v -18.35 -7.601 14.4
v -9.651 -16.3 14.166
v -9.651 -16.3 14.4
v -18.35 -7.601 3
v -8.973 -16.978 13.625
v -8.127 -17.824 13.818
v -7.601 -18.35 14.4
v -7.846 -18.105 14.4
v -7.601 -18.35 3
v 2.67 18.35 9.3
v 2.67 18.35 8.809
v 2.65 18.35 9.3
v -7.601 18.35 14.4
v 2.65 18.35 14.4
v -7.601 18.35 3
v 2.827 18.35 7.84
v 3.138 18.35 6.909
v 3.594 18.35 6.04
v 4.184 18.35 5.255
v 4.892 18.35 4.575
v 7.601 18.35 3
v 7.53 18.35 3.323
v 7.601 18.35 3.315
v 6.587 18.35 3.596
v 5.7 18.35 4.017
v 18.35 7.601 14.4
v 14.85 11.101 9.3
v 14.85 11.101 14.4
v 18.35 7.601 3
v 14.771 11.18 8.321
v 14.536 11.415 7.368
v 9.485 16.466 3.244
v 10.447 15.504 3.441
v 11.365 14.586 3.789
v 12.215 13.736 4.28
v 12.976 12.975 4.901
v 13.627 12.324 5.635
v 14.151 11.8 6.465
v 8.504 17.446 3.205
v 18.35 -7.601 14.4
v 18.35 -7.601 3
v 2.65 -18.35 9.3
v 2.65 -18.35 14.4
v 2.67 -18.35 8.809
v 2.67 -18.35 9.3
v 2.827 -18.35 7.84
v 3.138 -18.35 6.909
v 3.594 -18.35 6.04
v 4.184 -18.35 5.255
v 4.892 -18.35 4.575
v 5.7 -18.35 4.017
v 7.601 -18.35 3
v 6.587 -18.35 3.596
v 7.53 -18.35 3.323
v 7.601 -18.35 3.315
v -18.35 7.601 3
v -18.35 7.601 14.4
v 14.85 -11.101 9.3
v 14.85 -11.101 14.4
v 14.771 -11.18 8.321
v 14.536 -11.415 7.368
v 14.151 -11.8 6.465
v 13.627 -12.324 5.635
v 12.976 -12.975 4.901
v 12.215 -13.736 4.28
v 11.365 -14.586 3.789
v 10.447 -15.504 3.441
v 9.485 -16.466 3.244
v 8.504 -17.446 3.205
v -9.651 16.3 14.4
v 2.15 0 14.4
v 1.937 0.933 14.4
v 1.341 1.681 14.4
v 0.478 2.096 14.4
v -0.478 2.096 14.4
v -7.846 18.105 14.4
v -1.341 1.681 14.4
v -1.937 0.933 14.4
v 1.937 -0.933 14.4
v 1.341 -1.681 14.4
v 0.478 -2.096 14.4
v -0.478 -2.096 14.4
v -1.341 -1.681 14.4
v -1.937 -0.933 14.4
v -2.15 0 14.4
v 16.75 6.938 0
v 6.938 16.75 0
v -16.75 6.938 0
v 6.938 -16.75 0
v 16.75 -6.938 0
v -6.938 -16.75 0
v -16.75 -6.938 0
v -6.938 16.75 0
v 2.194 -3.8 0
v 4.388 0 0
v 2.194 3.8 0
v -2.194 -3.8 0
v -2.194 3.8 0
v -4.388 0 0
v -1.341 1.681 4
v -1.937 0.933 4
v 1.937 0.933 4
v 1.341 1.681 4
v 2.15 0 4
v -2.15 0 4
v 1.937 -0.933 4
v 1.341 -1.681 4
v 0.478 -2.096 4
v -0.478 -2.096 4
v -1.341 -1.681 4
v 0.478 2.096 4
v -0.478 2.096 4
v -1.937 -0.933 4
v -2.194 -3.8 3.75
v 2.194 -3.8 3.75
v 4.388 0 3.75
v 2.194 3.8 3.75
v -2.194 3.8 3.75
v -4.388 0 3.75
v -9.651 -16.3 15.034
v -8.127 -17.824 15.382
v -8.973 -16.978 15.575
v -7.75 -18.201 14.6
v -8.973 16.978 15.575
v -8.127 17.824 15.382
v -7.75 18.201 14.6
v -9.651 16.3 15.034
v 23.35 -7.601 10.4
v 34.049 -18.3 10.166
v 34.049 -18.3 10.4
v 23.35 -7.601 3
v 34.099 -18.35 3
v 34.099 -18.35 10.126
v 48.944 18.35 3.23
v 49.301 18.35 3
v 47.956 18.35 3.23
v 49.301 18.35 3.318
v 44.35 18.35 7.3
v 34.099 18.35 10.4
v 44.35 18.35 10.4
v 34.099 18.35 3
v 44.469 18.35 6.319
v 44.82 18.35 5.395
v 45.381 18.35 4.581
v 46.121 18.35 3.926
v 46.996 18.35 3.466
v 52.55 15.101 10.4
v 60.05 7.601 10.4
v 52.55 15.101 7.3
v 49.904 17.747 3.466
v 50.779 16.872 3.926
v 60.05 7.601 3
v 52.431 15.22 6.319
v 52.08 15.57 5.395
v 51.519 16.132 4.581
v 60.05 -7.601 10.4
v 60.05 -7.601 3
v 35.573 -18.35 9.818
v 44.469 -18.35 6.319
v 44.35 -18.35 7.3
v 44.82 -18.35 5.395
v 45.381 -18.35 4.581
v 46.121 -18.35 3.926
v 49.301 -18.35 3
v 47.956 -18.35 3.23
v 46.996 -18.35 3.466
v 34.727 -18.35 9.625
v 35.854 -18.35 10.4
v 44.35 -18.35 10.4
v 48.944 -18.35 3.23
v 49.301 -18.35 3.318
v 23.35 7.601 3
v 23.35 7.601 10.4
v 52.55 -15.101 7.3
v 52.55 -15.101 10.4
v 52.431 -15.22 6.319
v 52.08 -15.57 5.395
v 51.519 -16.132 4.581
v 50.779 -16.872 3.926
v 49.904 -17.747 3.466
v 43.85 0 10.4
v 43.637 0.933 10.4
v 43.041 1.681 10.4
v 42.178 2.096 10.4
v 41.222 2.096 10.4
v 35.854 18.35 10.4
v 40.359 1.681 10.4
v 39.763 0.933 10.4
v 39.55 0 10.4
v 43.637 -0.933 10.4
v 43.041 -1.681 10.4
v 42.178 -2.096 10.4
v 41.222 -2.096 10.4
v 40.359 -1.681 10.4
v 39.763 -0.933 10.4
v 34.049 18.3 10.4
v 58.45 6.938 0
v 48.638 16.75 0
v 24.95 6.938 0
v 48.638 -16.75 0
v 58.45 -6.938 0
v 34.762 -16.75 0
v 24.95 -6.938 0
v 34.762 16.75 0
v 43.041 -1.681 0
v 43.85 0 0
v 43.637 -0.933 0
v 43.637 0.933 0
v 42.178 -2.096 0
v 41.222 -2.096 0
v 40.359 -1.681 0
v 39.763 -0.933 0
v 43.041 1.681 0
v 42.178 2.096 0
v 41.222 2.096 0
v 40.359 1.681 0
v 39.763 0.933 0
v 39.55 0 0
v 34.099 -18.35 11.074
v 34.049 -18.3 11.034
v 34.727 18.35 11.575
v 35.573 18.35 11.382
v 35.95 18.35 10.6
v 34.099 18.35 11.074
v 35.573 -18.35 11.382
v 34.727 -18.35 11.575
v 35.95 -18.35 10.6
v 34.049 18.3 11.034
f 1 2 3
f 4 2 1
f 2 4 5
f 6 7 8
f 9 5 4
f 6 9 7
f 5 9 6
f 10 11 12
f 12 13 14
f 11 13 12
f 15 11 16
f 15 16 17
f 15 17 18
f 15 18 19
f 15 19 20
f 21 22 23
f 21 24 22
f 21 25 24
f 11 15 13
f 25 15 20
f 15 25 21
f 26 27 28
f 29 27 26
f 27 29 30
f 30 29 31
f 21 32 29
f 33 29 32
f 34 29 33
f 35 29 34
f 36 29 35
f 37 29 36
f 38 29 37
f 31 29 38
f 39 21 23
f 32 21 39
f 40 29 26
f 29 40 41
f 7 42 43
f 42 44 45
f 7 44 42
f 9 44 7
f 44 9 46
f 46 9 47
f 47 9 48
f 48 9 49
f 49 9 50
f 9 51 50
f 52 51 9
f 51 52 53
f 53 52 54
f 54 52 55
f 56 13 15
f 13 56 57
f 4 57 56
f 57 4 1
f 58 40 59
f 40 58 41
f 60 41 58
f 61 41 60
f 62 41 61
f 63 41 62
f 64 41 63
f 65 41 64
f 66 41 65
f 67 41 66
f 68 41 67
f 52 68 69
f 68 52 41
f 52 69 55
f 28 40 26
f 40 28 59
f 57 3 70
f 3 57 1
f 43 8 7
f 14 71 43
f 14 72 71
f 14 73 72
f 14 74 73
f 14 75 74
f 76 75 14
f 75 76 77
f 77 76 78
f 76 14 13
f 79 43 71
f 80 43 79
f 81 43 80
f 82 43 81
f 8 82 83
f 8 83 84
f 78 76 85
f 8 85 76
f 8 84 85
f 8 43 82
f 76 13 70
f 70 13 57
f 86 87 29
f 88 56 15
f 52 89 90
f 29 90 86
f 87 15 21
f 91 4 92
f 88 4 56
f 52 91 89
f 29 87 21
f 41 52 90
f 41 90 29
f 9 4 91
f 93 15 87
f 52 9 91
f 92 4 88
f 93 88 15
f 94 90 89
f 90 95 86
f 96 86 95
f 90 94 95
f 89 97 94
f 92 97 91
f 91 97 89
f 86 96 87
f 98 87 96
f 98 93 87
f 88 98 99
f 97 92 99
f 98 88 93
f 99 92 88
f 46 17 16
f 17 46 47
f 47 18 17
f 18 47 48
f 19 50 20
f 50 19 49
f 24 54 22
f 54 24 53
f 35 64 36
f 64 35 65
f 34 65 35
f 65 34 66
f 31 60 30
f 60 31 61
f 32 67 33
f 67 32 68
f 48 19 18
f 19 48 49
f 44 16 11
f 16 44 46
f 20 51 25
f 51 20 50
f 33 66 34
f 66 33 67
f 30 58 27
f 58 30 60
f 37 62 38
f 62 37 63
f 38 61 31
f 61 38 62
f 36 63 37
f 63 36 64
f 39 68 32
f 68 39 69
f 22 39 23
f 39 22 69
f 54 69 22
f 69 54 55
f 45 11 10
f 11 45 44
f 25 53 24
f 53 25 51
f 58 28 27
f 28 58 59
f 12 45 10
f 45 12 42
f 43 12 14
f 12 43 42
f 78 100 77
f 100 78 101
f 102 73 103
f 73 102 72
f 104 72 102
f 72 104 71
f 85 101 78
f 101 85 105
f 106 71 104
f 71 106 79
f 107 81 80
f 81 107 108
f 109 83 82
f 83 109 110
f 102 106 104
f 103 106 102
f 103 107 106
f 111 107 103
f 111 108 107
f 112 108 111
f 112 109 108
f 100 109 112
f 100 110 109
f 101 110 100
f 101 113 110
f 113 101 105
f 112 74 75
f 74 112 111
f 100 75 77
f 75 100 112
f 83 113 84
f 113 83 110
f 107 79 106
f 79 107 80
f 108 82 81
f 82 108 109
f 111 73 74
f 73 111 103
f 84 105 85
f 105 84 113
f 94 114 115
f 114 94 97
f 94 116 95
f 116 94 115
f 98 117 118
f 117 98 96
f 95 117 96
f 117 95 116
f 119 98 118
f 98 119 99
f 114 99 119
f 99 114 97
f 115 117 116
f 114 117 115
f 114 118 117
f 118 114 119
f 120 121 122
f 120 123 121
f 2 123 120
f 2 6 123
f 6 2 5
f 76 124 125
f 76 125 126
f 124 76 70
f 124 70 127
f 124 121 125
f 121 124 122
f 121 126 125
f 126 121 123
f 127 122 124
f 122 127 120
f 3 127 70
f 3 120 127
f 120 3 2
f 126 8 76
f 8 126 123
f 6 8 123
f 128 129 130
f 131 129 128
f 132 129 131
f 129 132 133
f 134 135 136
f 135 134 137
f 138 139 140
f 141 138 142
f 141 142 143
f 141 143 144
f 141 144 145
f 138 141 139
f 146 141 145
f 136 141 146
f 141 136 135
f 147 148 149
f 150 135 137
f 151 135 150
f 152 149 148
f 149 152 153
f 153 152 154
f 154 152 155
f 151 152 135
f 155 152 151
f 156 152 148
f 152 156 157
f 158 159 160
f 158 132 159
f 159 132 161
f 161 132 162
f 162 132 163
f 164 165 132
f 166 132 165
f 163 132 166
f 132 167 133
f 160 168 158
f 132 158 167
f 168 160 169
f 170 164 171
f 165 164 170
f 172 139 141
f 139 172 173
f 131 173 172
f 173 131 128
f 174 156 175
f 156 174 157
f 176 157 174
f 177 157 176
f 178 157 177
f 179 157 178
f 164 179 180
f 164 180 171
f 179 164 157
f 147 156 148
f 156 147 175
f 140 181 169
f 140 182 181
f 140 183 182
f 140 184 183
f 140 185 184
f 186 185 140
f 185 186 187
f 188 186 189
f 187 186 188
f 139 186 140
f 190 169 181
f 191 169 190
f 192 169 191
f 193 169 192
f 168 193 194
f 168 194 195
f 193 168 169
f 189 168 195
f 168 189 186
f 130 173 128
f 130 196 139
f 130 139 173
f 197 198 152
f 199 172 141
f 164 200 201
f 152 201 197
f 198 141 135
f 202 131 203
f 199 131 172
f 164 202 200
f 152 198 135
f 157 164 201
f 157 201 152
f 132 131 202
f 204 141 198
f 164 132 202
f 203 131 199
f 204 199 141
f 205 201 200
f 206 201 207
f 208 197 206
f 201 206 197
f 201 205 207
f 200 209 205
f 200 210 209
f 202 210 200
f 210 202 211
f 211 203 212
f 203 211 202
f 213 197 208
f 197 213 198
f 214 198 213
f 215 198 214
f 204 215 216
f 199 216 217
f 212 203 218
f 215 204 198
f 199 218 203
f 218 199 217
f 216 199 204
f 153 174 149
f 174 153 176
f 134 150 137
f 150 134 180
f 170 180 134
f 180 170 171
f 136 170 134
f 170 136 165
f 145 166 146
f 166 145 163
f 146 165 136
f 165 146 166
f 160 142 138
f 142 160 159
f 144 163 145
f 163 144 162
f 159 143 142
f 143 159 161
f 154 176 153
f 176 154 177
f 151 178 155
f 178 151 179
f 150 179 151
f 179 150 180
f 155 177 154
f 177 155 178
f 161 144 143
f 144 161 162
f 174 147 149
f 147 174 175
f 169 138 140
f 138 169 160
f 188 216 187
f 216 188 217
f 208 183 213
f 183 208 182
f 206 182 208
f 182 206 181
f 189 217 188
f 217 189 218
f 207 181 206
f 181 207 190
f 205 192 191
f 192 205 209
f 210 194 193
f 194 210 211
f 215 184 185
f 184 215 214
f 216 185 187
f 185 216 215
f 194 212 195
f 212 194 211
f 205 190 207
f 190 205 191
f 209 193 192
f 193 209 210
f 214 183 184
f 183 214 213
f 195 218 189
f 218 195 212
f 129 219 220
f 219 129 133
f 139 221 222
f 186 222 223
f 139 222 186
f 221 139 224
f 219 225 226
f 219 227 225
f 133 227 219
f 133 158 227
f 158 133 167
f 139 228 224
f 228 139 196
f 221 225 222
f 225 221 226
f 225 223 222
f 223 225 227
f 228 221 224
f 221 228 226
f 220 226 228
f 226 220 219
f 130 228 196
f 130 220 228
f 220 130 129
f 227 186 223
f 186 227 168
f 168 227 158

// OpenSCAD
/*
Author: Avp (Alexander Purikov)
Design is based on  http://www.thingiverse.com/thing:30328
Lisense is CC-BY-SA 3.0 (Creative commons Attribution-ShareAlike)

Avp:
 Code is rewritten almost completely -- only general part idea has retained. 
 Part is redisigned
  -- to be much easier to print
  -- to be possible to clamp rods with different diameter
  -- to avoid skewness.
 
*/

/*[Customizer Variables]*/

//Which part would you like to render?
part			=	"both"; //[part1:Part1, part2:Part2, both:Both]

//Diameter of Rod 1
Rod1Diameter = 12; //[6:20]

//Diameter of Rod 2
Rod2Diameter = 8; //[3:20]

//Screw type
NutName			=	"M4"; //[M3:M3, M4:M4, M6:M6]

/*[hidden]*/

CreateRidge = true;
Wall=3;
Gap=1;
ScrewSeparation=1;
Bevel = 3;
BevelAngle=30; //Too high angle is hard to print

M3=[5.5, 2.4, 3.0];
M4=[7.0, 3.2, 4.0];
M5=[7.0, 4.7, 5.0];
M6=[10.0, 5.2, 6.0];
M8=[13.0, 6.8, 8.0];
M10=[17.0, 8.4, 10.0];

UsedNut=( NutName == "M3" ) ? M3 : (( NutName == "M4" ) ? M4 : M6);

Clearance=0.2;
NutClearance=0.3;
o=0.05; // Little value, used to shift parts to avoid zero-width walls
MembraneThickness=0.2;

$fs=1;$fa=6;

function GetClampRadius () = max ( Rod1Diameter, Rod2Diameter) + Clearance + (UsedNut[2]+NutClearance)/2 + ScrewSeparation + Wall;

output();

module output()
{
	if (part == "part1") {
		ClampPart1();
	} else if (part == "part2") {
		ClampPart2();
	} else if (part == "both") {
		ClampPart1();
		translate([GetClampRadius()*2+5,0,0])
		ClampPart2();
	} 
}

module ClampPart1 ()
	{
	ClampPart ( Rod1Diameter+Clearance, max ( Rod1Diameter, Rod2Diameter)+Clearance );
	}
	
module ClampPart2 ()
	{
	ClampPart ( Rod2Diameter+Clearance, max ( Rod1Diameter, Rod2Diameter)+Clearance, CreateHexNut = false );
	}

	
module ClampPart( RodDiameter, MaxRodDiameter, CreateHexNut = true )
	{
	  OctagonInnerRadius = MaxRodDiameter + (UsedNut[2]+NutClearance)/2 + ScrewSeparation + Wall;
	  OctagonOuterRadius = OctagonInnerRadius/cos(180/8);
	  HWall=UsedNut[1]+MembraneThickness;
	  
	  difference() {
		
		  rotate([0,0,45/2])
			{
			// Main body
			translate([0,0,Bevel])
				cylinder(r=OctagonOuterRadius, h=RodDiameter+UsedNut[1]-Bevel-Gap, $fn=8);
				
			// Beveled body part	
			cylinder(r=OctagonOuterRadius-Bevel*tan(BevelAngle), r2=OctagonOuterRadius, h=Bevel, $fn=8);
				
			}
		
		// Rod slot
		translate([(RodDiameter+(UsedNut[2]+NutClearance)+ScrewSeparation)/2,0,UsedNut[1]+RodDiameter/2])
			{
			rotate ([90,0,0])
			cylinder(r=RodDiameter/2, h=80, center=true);
			translate([0,0,RodDiameter/2])
				{
				cube([RodDiameter, 100,RodDiameter], center=true);
				}
			}
		
		// Screw hole
		translate ([0,0,CreateHexNut ? UsedNut[1]+MembraneThickness+NutClearance*2 : -o] )	// Shift is made to leave a membrane above hex-slot to
			cylinder(r=(UsedNut[2]+NutClearance)/2 , h = 100 );		  						// make our thing easier to print.
		
		// Nut slot
		if ( CreateHexNut )
			{
			translate ([0,0,-o])
				NutSlot (UsedNut);
			}
		}

	  // Little (equal to Gap) ridge, parallel and symmetric to rod
	  if (CreateRidge)
		{
		translate ([0,0,RodDiameter+HWall-Gap])
		intersection ()
			{
			translate ([0,0,-Gap])
				rotate([0,0,45/2])
					cylinder(r=OctagonInnerRadius/cos(180/8), h=Gap*2, $fn=8);
			translate ([-(RodDiameter+(UsedNut[2]+NutClearance)+ScrewSeparation)/2,OctagonInnerRadius,0])
				rotate ([90,0,0])
					cylinder (r=Gap,h=OctagonInnerRadius*2);
		
			}
		}
	}

module NutSlot (Slot, SideOpen=false)
	{
	cylinder (r=(Slot[0]/2+NutClearance)*2/sqrt(3), h=Slot[1]+NutClearance*2, $fn=6);
	if ( SideOpen )
		translate ([0,-(Slot[0]+NutClearance*2)/2,0])
			cube ([Slot[0]+NutClearance*2+4,Slot[0]+NutClearance*2,Slot[1]+NutClearance*2]);
	}
